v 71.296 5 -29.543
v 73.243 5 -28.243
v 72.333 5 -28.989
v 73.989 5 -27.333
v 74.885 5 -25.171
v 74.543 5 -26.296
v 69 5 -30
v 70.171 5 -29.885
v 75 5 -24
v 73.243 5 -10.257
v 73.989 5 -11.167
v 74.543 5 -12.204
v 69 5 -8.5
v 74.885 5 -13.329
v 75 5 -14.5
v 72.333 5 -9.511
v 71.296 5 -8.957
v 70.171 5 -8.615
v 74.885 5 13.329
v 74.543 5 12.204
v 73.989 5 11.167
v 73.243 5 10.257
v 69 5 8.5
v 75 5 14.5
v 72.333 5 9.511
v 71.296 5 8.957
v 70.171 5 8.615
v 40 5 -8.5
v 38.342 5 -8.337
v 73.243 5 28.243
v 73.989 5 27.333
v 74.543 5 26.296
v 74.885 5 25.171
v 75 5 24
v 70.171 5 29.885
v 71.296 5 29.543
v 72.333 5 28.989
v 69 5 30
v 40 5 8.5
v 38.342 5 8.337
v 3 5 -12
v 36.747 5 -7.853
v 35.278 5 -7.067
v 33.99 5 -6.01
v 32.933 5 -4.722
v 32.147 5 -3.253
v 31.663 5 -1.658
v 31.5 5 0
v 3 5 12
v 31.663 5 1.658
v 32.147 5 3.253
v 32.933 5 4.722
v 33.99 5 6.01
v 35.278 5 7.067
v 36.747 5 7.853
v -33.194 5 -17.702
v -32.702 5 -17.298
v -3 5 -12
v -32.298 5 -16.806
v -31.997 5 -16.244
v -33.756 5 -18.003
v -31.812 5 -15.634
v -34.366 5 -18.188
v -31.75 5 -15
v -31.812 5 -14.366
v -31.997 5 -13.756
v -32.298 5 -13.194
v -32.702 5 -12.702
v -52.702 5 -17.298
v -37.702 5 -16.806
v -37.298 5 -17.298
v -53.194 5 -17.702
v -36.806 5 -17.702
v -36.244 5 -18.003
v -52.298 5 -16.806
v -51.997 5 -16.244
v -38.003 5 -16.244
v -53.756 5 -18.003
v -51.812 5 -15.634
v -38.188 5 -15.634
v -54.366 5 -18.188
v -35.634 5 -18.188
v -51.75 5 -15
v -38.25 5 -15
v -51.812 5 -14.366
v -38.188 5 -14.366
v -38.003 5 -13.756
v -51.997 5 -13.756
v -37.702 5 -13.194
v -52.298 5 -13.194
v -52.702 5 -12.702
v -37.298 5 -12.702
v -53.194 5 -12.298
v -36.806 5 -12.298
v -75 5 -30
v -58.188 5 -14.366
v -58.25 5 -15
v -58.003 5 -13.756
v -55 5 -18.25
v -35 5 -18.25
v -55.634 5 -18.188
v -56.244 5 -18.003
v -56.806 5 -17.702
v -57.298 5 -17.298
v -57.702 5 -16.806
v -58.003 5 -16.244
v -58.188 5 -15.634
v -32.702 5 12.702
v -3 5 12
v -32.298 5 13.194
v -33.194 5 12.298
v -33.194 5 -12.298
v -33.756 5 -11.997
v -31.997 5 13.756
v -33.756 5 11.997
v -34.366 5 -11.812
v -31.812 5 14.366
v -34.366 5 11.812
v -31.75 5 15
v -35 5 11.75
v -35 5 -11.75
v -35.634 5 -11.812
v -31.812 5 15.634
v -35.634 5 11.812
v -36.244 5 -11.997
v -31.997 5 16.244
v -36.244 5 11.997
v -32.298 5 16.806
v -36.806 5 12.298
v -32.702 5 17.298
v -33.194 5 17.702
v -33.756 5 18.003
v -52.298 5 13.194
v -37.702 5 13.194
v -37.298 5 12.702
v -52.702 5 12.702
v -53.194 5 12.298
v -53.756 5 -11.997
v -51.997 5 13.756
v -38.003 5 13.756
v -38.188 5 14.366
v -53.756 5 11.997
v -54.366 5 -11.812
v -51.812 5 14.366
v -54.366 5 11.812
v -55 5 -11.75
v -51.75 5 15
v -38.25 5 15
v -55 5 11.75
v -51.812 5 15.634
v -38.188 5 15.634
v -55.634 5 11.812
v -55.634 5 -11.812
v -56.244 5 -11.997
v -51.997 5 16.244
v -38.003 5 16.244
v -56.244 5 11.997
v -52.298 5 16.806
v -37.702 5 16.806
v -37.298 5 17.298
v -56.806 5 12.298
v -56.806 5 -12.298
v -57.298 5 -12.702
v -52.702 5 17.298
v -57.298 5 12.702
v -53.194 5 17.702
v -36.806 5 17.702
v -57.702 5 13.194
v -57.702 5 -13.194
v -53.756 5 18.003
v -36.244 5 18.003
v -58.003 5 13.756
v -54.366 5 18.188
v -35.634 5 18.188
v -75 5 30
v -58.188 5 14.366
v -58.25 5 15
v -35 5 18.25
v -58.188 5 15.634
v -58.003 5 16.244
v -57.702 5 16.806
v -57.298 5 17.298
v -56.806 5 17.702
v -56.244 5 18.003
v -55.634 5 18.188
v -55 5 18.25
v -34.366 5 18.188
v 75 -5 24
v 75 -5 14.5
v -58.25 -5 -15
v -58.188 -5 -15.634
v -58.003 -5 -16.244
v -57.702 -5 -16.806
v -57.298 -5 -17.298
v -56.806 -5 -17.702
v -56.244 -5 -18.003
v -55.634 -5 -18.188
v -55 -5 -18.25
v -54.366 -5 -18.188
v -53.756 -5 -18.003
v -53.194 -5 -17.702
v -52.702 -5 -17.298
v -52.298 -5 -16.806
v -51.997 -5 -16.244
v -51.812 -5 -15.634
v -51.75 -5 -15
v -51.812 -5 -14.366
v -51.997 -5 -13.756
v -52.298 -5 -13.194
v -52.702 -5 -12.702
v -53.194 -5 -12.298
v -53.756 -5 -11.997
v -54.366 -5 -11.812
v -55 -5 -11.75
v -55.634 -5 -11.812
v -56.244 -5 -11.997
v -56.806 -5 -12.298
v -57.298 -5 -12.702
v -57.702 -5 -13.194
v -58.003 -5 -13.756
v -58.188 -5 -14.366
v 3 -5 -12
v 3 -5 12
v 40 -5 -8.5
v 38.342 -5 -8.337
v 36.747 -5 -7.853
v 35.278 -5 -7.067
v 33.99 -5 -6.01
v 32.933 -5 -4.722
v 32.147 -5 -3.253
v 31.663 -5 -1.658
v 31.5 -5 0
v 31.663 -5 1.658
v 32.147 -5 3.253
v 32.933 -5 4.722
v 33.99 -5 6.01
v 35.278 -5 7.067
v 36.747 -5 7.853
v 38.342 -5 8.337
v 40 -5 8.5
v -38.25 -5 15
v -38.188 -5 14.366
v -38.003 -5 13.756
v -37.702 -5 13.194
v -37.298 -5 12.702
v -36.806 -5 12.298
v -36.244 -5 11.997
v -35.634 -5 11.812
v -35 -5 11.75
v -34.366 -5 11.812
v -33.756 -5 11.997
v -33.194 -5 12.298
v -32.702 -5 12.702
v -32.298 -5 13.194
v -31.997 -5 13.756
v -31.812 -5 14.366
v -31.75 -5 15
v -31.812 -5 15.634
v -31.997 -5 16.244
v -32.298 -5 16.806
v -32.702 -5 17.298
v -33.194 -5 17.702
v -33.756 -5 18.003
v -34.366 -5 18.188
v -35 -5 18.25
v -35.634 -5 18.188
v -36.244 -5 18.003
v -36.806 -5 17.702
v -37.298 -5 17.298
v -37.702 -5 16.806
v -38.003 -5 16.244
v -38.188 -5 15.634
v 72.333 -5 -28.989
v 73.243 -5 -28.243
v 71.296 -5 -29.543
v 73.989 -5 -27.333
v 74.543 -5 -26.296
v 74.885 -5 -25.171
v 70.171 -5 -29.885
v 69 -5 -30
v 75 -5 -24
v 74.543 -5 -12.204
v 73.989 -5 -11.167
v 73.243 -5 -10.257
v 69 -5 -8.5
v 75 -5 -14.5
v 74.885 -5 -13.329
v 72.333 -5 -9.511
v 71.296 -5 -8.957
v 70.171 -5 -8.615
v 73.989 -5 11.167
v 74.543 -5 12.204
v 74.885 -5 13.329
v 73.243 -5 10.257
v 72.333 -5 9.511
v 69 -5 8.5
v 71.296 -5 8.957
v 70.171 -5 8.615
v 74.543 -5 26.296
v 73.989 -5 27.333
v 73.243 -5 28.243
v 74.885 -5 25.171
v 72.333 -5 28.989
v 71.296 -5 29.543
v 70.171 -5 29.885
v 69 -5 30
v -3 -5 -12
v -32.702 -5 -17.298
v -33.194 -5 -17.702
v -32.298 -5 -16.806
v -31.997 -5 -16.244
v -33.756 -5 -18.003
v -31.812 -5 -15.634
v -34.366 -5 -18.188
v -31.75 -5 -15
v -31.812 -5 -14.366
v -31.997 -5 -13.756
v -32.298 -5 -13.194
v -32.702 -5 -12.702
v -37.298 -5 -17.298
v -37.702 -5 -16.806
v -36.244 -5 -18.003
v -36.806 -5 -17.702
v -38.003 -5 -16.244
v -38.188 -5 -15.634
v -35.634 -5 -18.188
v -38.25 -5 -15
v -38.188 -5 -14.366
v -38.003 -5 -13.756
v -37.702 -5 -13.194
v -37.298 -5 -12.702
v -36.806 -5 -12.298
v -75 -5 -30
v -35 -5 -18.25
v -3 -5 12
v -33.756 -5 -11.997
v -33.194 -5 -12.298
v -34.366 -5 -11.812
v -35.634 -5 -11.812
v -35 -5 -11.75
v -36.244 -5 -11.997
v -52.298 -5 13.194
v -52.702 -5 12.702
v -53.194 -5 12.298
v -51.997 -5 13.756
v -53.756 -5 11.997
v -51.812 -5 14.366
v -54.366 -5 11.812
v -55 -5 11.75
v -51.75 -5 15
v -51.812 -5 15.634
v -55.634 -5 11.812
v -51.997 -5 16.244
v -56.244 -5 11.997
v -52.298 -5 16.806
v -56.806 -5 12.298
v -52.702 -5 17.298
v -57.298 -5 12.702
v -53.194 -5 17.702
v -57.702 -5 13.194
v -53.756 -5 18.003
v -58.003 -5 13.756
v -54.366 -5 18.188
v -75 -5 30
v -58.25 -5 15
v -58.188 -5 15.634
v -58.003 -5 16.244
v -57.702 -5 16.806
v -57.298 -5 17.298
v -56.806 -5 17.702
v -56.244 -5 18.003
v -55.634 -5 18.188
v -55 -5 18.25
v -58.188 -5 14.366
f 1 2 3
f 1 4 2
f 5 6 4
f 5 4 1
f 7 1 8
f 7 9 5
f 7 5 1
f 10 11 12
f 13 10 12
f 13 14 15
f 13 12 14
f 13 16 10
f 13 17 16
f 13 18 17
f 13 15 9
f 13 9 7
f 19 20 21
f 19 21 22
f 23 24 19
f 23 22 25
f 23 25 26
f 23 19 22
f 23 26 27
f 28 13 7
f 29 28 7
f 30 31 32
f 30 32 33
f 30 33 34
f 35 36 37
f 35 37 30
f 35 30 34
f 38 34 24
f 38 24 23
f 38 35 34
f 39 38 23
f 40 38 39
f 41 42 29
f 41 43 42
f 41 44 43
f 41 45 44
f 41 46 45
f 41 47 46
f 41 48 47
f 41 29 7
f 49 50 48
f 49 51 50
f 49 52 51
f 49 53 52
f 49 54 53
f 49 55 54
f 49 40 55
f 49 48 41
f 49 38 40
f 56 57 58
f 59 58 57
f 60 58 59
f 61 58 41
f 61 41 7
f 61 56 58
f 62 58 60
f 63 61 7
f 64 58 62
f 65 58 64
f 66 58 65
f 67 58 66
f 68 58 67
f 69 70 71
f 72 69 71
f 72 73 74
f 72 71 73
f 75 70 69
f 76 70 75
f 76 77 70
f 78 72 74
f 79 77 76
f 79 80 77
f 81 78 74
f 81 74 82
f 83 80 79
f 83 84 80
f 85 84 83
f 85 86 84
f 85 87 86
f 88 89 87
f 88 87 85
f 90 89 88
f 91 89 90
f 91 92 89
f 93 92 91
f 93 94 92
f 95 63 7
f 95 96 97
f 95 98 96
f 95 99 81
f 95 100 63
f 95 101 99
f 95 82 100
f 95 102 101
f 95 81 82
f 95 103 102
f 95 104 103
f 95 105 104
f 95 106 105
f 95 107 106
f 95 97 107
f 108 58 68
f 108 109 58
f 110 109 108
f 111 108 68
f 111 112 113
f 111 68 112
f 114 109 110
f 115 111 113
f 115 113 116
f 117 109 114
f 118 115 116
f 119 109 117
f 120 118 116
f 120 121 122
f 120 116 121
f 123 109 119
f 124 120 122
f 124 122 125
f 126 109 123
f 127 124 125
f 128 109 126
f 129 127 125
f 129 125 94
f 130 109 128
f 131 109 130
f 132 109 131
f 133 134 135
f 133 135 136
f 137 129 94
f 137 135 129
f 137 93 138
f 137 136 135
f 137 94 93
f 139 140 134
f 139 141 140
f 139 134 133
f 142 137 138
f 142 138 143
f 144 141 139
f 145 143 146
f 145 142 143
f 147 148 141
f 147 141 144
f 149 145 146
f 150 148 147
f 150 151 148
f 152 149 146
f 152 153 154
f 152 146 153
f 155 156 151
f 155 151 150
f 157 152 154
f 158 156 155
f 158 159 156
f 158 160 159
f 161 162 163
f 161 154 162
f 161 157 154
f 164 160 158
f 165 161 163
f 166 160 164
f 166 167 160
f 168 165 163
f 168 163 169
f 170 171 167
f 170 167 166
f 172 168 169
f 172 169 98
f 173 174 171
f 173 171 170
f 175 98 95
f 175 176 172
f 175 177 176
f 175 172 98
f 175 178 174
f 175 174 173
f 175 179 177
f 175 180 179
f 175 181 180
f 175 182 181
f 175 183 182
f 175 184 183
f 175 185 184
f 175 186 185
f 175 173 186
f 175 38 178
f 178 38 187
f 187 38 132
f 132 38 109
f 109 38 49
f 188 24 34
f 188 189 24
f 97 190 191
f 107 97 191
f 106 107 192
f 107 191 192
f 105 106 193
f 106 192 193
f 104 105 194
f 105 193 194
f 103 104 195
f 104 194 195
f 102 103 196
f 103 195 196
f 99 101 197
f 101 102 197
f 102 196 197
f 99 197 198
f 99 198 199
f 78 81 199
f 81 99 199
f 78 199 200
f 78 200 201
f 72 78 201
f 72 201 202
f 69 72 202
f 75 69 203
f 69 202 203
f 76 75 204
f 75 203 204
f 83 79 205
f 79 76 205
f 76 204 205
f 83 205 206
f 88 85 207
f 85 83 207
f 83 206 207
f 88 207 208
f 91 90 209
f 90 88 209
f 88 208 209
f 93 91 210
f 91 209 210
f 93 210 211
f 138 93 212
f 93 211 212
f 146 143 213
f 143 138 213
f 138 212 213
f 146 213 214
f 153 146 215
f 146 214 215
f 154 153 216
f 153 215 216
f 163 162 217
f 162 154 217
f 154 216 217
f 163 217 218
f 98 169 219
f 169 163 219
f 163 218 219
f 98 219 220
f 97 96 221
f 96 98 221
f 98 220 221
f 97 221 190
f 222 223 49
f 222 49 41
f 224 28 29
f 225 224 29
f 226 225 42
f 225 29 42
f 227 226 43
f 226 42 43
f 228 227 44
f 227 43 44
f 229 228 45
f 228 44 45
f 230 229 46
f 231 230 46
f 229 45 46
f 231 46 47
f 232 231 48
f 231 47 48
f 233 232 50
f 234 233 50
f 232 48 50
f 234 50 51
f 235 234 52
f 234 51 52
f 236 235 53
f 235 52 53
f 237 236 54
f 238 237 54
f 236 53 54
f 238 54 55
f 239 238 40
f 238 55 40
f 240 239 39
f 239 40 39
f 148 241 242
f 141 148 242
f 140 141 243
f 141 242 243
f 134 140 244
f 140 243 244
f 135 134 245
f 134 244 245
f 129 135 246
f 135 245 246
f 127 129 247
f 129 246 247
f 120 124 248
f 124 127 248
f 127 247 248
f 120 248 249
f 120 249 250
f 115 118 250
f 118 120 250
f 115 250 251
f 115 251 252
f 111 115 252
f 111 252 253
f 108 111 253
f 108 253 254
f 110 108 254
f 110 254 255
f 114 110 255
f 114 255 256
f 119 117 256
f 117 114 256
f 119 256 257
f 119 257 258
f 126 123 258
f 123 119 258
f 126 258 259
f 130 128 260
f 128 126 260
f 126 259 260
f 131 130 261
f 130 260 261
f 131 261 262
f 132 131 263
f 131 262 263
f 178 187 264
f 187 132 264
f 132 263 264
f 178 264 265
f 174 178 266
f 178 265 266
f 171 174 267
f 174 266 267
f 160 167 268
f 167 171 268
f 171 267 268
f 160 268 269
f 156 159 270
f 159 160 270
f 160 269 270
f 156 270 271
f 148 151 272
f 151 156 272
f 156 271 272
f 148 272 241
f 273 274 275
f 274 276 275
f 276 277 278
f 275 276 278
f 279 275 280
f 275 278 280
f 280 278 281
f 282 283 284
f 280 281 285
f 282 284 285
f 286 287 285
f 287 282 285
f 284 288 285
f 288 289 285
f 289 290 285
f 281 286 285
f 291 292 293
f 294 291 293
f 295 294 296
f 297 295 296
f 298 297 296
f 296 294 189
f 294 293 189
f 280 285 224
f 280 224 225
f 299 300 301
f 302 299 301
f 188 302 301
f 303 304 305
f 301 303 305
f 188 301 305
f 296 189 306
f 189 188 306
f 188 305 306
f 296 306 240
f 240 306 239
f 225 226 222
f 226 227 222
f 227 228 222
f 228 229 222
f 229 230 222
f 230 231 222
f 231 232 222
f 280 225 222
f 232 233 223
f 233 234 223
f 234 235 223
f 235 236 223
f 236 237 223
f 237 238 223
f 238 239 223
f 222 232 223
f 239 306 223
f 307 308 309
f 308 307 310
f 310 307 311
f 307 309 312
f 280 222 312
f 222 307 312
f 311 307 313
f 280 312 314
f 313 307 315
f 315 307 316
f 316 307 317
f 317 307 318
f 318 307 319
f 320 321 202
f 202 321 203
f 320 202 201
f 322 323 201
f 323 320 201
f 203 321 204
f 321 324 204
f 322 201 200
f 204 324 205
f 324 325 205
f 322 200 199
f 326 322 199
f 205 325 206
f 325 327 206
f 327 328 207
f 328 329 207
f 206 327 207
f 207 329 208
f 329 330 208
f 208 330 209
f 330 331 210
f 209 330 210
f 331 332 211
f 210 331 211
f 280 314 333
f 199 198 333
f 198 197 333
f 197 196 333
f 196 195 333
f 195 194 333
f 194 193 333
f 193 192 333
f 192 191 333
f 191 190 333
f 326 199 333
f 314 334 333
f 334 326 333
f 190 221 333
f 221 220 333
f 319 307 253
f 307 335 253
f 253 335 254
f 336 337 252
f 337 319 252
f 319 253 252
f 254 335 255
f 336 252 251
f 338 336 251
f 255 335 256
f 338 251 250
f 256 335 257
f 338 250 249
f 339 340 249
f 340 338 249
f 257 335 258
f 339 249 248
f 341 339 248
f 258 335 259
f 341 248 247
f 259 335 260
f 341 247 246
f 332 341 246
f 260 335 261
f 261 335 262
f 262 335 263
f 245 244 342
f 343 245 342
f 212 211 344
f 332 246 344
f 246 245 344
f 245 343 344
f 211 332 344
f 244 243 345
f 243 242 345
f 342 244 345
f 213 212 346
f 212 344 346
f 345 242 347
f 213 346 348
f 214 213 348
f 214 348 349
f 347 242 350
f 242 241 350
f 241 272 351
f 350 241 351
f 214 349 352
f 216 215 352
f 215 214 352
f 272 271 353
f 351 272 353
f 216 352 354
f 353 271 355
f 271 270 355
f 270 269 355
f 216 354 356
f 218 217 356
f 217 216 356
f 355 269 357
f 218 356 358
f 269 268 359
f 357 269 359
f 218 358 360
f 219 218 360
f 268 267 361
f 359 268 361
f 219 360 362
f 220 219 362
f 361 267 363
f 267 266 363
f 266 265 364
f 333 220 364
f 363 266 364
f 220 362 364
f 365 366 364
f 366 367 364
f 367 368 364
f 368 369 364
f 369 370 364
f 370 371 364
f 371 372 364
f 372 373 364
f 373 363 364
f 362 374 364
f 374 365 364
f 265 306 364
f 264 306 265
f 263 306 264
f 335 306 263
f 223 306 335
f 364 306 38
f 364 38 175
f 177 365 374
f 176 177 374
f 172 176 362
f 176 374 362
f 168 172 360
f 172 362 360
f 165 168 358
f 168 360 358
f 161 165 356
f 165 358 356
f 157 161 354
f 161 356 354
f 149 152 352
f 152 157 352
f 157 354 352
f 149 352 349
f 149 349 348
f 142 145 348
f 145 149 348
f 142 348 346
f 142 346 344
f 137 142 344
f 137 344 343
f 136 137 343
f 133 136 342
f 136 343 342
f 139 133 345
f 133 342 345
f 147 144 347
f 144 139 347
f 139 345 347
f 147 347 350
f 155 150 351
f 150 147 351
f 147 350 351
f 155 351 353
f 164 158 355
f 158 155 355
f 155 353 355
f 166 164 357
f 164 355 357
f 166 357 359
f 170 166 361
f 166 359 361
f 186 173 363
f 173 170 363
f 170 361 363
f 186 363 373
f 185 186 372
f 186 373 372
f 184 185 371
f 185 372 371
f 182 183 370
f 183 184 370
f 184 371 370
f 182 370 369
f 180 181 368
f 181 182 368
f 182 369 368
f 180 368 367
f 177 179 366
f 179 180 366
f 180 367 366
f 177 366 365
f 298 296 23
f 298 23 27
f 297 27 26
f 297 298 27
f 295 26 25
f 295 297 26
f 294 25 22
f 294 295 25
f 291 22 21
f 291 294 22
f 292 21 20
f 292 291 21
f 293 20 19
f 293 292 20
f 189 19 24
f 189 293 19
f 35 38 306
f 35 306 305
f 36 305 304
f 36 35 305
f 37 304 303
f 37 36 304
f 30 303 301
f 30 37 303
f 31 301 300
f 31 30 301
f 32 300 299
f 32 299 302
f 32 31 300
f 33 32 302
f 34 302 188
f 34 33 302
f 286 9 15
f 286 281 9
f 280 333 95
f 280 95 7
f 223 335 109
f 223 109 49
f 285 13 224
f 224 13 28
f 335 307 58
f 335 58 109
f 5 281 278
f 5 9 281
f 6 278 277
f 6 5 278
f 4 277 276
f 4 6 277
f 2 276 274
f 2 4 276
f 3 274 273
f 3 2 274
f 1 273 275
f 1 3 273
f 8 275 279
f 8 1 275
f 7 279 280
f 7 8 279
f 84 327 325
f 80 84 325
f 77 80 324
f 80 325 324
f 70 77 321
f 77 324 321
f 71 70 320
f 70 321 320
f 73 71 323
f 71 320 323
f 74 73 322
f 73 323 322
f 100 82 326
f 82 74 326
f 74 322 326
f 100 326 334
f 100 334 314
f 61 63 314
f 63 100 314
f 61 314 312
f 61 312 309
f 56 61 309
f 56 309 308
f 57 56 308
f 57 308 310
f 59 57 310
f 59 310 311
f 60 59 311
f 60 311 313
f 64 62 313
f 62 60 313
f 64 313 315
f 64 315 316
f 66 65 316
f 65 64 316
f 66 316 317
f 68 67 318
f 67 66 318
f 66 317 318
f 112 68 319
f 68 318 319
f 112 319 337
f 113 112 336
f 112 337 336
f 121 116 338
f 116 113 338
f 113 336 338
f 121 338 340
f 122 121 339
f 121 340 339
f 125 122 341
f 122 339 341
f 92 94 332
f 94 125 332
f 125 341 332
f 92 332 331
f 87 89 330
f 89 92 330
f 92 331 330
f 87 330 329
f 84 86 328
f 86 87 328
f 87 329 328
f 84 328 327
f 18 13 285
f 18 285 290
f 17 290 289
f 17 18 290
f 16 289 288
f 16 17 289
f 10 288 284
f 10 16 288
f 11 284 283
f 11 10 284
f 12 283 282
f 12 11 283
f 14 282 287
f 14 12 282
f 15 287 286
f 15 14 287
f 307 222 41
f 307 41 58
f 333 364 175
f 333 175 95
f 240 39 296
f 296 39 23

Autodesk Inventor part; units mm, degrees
ref_plane "YZ Plane" through (0, 0, 0) normal (1, 0, 0) x (0, 1, 0)
ref_plane "XZ Plane" through (0, 0, 0) normal (0, 1, 0) x (-1, 0, 0)
ref_plane "XY Plane" through (0, 0, 0) normal (0, 0, 1) x (1, 0, 0)
sketch "Sketch1" plane through (0, 0, 0) normal (0, 1, 0) x (-1, 0, 0)
  line L0 (-75, 30) -> (75, 30)
  line L1 (75, 30) -> (75, -30)
  line L2 (75, -30) -> (-75, -30)
  line L3 (-75, -30) -> (-75, 30)
  line L4 (-75, 30) -> (75, -30) construction
  line L5 (75, 30) -> (-75, -30) construction
  line L6 (-80, 0) -> (-40, 0) construction
  line L7 (-80, -8.5) -> (-40, -8.5)
  line L8 (-40, 8.5) -> (-80, 8.5)
  arc A0 (-80, 8.5) -> (-80, -8.5) centre (-80, 0) ccw
  arc A1 (-40, -8.5) -> (-40, 8.5) centre (-40, 0) ccw
  circle A2 centre (55, 15) radius 3.25
  circle A3 centre (55, -15) radius 3.25
  circle A4 centre (35, 15) radius 3.25
  circle A5 centre (35, -15) radius 3.25
  point P0 (0, 0)
  point P1 (-60, 0)
  dimension "d0" = 60
  dimension "d1" = 150
  dimension "d2" = 60
  dimension "d3" = 40
  dimension "d4" = 17
  dimension "d5" = 6.5
  dimension "d6" = 15
  dimension "d7" = 30
  dimension "d8" = 20
  dimension "d9" = 20
extrude "Plate1" add sketch "Sketch1" along normal mid plane 10 contours L0 L1 L2 L3 L7 A1 L8 | L8 A1 L7 L3
extrude "Cut1" cut sketch "Sketch1" against normal mid plane 10 contours L8 A1 L7 L3 | L3 L7 A0 L8
sketch "Sketch2" plane through (0, -5, 0) normal (0, -1, 0) x (1, 0, 0)
  line L0 (-3, 12) -> (3, 12)
  line L1 (3, 12) -> (3, -12)
  line L2 (3, -12) -> (-3, -12)
  line L3 (-3, -12) -> (-3, 12)
  line L4 (75, 30) -> (-75, 30) projected
  point P0 (0, 0)
  point P1 (0, 12)
  dimension "d13" = 24
  dimension "d14" = 18
  dimension "d15" = 6
extrude "Cut2" cut sketch "Sketch2" against normal blind 10
fillet "Corner Round1" radius 6 4 edges at (75, 0, 30) (75, 0, 8.5) (75, 0, -8.5) (75, 0, -30)
equation "\"d11\" = Thickness"
equation "\"d16\" = Thickness"
equation "\"d10\" = Thickness"
equation "\"BendReliefDepth\" = 0.5 * Thickness"
equation "\"Thickness\" = 10"
properties part number "HCMUTE-CDT23-BAT_TRUC_CANG_TAI" material "Stainless Steel"
